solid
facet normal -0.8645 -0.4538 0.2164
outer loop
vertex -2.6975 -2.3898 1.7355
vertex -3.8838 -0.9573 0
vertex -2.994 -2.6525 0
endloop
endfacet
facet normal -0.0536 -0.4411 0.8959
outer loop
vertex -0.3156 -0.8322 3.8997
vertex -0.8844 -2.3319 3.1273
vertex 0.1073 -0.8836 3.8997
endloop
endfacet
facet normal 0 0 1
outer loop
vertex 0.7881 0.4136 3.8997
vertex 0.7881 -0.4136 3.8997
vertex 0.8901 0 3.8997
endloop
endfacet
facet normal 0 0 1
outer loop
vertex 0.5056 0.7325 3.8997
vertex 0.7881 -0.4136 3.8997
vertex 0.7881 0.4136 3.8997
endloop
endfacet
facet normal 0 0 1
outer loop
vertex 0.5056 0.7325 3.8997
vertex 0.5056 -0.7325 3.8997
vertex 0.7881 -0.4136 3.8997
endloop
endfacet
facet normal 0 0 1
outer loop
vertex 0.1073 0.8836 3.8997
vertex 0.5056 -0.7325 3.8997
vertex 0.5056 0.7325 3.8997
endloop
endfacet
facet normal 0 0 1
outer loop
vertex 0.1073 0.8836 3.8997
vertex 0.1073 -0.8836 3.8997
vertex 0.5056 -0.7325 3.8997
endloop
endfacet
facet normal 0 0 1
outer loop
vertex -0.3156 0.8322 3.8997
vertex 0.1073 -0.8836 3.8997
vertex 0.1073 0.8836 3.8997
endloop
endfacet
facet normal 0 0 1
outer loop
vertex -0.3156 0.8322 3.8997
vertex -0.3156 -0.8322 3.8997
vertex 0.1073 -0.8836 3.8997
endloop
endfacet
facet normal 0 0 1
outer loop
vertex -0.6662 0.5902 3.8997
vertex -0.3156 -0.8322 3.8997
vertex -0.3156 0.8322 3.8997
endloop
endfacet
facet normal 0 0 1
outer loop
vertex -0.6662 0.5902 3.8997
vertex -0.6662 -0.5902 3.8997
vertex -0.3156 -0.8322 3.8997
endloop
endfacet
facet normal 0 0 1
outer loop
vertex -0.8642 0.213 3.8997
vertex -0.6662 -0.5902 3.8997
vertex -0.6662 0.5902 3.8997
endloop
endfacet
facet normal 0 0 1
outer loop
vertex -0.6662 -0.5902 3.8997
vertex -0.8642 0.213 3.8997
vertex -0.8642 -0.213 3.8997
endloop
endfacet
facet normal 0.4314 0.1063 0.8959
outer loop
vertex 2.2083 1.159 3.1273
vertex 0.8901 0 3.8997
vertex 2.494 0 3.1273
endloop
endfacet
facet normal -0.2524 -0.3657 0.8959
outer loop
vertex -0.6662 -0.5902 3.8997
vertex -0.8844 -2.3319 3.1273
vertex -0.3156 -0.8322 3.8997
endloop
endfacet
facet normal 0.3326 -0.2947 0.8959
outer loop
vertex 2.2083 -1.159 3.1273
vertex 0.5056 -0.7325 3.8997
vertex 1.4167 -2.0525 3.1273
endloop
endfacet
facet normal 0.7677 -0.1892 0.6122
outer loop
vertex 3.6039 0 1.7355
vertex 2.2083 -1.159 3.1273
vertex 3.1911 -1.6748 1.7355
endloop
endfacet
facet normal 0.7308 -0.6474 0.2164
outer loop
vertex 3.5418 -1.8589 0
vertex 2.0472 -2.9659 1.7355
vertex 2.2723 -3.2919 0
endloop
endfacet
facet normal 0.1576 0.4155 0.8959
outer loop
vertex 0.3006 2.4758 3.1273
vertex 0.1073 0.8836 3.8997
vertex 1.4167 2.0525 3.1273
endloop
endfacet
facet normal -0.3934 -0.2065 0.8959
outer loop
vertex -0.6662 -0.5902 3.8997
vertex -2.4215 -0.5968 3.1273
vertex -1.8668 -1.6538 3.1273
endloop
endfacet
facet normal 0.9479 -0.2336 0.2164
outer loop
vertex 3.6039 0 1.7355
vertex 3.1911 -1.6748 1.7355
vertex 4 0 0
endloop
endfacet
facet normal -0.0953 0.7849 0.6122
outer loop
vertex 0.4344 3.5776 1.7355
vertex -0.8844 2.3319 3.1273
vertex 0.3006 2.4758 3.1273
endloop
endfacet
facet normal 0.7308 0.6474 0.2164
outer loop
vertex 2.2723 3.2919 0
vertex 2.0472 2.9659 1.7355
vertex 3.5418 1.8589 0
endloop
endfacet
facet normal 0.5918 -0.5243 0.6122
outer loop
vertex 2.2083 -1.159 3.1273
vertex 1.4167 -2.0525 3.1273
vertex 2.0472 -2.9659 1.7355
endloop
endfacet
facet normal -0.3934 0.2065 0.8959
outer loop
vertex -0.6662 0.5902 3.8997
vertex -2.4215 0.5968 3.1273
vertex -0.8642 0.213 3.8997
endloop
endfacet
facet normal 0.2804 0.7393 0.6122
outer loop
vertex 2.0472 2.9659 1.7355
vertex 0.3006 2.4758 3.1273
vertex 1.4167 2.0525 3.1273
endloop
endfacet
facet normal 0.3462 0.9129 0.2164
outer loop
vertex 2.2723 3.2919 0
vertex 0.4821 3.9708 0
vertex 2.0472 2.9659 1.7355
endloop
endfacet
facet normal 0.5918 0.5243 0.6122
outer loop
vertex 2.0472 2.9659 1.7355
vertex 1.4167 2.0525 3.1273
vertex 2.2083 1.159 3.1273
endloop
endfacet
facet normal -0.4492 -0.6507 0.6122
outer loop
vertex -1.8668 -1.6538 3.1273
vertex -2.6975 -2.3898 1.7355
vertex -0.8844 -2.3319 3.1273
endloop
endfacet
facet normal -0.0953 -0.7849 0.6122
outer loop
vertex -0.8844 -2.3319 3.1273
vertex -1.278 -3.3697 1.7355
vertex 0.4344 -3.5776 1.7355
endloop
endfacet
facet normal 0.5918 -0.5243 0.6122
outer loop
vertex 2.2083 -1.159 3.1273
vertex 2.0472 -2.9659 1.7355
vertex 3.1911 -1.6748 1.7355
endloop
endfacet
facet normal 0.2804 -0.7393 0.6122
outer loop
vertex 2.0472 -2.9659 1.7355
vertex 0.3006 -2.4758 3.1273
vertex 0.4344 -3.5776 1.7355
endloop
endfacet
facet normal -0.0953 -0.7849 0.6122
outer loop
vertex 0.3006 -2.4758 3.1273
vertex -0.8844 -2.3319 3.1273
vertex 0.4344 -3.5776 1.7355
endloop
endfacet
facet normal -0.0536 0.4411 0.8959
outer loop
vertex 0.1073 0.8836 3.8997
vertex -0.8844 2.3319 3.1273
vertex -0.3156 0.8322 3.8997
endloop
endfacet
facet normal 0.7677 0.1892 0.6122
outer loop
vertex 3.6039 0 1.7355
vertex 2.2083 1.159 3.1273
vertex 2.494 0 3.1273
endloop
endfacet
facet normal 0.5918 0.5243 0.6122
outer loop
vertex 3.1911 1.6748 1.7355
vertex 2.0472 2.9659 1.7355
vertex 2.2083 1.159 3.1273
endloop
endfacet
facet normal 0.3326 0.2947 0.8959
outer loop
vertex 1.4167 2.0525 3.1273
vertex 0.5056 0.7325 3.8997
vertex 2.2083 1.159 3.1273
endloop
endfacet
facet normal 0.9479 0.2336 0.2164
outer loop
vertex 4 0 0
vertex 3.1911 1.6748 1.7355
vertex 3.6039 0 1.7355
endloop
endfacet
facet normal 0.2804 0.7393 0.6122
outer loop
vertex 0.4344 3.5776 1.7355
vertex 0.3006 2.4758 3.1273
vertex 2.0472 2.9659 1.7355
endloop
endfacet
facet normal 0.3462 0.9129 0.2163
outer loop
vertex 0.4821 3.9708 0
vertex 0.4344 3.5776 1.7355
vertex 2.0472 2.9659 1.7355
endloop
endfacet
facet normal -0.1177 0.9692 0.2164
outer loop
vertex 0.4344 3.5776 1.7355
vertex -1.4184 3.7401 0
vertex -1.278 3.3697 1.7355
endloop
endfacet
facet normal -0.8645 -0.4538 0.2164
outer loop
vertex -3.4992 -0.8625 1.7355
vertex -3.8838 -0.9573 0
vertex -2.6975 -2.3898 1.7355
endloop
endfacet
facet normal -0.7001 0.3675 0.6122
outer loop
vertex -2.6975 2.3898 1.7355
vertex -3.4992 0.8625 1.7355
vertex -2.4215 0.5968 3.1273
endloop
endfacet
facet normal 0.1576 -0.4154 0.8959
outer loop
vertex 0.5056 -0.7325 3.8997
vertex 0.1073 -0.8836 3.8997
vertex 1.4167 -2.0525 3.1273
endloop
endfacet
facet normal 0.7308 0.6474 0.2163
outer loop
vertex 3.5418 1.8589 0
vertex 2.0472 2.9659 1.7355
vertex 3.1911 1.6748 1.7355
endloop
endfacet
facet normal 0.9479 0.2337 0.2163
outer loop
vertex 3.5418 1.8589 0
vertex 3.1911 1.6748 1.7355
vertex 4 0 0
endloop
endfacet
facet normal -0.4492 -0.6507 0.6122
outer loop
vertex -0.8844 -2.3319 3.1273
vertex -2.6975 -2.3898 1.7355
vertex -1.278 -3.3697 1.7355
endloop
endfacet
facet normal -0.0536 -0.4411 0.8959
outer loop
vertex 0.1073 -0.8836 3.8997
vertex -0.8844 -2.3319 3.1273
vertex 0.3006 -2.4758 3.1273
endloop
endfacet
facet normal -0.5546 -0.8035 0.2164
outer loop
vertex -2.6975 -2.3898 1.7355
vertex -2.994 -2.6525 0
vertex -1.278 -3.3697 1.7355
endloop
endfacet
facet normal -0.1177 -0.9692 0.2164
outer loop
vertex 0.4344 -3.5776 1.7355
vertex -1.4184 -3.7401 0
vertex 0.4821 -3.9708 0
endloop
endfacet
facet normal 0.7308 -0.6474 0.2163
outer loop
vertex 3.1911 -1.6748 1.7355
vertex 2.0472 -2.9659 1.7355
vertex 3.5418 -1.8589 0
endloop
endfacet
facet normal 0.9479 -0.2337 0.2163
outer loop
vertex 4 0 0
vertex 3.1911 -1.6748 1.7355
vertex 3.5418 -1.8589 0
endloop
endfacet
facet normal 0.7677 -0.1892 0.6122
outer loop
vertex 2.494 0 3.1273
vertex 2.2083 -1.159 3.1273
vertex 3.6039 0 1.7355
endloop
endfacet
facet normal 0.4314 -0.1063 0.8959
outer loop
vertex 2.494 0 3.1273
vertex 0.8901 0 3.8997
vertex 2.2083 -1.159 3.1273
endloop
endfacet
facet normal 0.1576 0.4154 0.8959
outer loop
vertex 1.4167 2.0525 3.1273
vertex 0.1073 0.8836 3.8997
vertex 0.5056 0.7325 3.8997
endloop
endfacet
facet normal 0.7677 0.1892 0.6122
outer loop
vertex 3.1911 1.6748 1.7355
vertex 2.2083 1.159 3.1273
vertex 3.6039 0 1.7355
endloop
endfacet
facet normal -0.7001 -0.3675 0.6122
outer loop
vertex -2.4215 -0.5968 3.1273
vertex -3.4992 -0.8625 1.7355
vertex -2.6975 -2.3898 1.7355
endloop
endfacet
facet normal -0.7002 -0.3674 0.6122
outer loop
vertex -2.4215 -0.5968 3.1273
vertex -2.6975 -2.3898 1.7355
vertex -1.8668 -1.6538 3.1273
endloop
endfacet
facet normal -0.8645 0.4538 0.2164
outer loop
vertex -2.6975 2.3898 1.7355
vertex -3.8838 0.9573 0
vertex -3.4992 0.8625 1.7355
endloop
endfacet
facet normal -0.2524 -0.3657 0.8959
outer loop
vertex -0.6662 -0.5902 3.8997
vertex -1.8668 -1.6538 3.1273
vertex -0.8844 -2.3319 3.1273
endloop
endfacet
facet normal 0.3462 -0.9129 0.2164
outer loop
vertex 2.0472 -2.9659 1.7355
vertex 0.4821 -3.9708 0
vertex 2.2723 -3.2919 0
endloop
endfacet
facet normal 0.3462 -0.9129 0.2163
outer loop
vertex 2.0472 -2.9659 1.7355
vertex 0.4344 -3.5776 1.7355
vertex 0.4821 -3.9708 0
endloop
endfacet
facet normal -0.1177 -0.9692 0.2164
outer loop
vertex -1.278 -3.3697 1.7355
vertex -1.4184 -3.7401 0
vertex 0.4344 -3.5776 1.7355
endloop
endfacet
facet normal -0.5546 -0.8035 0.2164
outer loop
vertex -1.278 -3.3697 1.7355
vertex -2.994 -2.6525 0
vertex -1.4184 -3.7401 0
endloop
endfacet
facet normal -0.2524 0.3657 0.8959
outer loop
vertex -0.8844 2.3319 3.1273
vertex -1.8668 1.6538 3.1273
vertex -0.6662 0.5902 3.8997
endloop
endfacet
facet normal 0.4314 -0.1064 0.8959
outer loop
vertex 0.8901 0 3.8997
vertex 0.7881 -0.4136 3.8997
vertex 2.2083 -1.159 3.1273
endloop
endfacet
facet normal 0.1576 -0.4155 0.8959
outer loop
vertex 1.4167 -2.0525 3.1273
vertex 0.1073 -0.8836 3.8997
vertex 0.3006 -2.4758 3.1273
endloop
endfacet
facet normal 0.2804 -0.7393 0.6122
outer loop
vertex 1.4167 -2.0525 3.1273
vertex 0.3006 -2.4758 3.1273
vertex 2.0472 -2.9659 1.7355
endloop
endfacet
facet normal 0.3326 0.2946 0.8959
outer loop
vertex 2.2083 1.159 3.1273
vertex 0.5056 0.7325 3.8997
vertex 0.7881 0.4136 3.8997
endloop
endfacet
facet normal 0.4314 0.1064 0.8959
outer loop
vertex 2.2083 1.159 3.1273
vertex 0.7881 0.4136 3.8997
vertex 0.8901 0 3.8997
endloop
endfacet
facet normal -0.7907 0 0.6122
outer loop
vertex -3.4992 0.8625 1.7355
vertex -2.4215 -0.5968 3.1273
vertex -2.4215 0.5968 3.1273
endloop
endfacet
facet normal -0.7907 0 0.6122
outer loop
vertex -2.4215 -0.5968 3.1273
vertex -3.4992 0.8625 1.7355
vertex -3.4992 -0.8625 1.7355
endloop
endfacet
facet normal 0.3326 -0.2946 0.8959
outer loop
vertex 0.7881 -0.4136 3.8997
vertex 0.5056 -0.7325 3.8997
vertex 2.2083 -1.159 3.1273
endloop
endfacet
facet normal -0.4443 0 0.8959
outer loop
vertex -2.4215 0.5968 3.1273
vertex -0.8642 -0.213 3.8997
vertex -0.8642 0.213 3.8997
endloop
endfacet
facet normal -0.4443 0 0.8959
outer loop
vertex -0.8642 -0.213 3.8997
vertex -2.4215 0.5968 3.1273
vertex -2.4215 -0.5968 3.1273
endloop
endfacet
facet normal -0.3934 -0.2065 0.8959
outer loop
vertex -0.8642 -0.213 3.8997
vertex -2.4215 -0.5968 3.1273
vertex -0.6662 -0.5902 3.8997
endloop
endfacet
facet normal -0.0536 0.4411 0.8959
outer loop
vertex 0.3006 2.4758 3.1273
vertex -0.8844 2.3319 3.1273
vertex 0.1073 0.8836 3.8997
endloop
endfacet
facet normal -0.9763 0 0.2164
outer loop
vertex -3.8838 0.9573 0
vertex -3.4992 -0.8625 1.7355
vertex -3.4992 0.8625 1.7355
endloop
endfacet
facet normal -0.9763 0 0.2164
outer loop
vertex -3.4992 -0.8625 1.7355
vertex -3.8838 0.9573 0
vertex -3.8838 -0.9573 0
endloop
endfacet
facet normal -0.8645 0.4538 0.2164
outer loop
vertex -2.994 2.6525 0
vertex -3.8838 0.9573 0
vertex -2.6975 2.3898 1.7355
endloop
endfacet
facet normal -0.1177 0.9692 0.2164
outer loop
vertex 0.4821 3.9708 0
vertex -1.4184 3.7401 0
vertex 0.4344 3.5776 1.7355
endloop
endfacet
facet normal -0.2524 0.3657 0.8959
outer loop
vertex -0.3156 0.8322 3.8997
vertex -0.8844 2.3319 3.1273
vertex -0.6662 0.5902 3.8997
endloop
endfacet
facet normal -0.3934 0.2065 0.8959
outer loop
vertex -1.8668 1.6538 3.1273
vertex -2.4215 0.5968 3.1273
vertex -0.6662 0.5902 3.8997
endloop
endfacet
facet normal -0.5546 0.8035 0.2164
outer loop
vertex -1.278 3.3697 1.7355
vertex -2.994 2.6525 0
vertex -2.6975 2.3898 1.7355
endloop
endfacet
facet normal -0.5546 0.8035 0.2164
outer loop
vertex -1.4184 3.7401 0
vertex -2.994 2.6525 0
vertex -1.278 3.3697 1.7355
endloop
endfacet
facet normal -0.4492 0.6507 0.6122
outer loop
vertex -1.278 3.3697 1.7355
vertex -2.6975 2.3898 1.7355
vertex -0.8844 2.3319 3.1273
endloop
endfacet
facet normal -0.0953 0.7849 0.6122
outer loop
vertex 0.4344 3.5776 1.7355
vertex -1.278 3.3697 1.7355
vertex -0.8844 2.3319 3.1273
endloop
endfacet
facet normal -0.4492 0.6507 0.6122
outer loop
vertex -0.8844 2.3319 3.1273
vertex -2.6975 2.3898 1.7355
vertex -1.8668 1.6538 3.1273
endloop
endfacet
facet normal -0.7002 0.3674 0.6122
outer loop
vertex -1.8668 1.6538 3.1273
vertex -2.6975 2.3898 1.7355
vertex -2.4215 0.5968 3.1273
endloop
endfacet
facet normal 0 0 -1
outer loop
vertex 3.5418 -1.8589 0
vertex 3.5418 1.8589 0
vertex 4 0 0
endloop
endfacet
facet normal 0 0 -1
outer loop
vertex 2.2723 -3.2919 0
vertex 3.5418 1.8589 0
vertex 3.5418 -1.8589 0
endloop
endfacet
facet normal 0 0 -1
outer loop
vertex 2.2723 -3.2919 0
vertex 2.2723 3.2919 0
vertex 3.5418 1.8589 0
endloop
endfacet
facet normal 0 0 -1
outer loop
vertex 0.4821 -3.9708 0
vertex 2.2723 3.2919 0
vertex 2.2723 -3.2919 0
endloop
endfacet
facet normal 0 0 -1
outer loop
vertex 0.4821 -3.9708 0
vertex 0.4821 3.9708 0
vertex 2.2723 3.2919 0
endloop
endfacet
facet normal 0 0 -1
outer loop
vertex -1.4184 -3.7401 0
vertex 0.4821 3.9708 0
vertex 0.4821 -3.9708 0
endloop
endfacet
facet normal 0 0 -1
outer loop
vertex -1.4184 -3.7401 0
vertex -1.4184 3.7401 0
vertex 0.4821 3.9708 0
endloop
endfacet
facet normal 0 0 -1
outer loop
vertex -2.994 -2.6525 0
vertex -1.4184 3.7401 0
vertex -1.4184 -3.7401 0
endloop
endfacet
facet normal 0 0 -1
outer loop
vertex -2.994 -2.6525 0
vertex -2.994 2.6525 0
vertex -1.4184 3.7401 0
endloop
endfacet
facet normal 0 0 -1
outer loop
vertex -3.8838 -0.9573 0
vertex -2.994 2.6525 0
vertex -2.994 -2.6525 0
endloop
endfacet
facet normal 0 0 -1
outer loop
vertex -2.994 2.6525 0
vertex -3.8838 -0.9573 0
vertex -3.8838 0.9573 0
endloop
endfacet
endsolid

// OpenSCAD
// studs/dome.scad — half-sphere stud.
// MIT licensed.

module stud_dome(size = 6, tip_radius = 0.4, height = undef) {
    // `size` is the base diameter; `tip_radius` is unused for a dome
    // (the dome is naturally rounded). `height` defaults to a half-sphere.
    r = size / 2;
    h = is_undef(height) ? r : height;

    intersection() {
        sphere(r = r);
        translate([-r, -r, 0]) cube([size, size, h]);
    }
}

stud_dome(size = 8);
